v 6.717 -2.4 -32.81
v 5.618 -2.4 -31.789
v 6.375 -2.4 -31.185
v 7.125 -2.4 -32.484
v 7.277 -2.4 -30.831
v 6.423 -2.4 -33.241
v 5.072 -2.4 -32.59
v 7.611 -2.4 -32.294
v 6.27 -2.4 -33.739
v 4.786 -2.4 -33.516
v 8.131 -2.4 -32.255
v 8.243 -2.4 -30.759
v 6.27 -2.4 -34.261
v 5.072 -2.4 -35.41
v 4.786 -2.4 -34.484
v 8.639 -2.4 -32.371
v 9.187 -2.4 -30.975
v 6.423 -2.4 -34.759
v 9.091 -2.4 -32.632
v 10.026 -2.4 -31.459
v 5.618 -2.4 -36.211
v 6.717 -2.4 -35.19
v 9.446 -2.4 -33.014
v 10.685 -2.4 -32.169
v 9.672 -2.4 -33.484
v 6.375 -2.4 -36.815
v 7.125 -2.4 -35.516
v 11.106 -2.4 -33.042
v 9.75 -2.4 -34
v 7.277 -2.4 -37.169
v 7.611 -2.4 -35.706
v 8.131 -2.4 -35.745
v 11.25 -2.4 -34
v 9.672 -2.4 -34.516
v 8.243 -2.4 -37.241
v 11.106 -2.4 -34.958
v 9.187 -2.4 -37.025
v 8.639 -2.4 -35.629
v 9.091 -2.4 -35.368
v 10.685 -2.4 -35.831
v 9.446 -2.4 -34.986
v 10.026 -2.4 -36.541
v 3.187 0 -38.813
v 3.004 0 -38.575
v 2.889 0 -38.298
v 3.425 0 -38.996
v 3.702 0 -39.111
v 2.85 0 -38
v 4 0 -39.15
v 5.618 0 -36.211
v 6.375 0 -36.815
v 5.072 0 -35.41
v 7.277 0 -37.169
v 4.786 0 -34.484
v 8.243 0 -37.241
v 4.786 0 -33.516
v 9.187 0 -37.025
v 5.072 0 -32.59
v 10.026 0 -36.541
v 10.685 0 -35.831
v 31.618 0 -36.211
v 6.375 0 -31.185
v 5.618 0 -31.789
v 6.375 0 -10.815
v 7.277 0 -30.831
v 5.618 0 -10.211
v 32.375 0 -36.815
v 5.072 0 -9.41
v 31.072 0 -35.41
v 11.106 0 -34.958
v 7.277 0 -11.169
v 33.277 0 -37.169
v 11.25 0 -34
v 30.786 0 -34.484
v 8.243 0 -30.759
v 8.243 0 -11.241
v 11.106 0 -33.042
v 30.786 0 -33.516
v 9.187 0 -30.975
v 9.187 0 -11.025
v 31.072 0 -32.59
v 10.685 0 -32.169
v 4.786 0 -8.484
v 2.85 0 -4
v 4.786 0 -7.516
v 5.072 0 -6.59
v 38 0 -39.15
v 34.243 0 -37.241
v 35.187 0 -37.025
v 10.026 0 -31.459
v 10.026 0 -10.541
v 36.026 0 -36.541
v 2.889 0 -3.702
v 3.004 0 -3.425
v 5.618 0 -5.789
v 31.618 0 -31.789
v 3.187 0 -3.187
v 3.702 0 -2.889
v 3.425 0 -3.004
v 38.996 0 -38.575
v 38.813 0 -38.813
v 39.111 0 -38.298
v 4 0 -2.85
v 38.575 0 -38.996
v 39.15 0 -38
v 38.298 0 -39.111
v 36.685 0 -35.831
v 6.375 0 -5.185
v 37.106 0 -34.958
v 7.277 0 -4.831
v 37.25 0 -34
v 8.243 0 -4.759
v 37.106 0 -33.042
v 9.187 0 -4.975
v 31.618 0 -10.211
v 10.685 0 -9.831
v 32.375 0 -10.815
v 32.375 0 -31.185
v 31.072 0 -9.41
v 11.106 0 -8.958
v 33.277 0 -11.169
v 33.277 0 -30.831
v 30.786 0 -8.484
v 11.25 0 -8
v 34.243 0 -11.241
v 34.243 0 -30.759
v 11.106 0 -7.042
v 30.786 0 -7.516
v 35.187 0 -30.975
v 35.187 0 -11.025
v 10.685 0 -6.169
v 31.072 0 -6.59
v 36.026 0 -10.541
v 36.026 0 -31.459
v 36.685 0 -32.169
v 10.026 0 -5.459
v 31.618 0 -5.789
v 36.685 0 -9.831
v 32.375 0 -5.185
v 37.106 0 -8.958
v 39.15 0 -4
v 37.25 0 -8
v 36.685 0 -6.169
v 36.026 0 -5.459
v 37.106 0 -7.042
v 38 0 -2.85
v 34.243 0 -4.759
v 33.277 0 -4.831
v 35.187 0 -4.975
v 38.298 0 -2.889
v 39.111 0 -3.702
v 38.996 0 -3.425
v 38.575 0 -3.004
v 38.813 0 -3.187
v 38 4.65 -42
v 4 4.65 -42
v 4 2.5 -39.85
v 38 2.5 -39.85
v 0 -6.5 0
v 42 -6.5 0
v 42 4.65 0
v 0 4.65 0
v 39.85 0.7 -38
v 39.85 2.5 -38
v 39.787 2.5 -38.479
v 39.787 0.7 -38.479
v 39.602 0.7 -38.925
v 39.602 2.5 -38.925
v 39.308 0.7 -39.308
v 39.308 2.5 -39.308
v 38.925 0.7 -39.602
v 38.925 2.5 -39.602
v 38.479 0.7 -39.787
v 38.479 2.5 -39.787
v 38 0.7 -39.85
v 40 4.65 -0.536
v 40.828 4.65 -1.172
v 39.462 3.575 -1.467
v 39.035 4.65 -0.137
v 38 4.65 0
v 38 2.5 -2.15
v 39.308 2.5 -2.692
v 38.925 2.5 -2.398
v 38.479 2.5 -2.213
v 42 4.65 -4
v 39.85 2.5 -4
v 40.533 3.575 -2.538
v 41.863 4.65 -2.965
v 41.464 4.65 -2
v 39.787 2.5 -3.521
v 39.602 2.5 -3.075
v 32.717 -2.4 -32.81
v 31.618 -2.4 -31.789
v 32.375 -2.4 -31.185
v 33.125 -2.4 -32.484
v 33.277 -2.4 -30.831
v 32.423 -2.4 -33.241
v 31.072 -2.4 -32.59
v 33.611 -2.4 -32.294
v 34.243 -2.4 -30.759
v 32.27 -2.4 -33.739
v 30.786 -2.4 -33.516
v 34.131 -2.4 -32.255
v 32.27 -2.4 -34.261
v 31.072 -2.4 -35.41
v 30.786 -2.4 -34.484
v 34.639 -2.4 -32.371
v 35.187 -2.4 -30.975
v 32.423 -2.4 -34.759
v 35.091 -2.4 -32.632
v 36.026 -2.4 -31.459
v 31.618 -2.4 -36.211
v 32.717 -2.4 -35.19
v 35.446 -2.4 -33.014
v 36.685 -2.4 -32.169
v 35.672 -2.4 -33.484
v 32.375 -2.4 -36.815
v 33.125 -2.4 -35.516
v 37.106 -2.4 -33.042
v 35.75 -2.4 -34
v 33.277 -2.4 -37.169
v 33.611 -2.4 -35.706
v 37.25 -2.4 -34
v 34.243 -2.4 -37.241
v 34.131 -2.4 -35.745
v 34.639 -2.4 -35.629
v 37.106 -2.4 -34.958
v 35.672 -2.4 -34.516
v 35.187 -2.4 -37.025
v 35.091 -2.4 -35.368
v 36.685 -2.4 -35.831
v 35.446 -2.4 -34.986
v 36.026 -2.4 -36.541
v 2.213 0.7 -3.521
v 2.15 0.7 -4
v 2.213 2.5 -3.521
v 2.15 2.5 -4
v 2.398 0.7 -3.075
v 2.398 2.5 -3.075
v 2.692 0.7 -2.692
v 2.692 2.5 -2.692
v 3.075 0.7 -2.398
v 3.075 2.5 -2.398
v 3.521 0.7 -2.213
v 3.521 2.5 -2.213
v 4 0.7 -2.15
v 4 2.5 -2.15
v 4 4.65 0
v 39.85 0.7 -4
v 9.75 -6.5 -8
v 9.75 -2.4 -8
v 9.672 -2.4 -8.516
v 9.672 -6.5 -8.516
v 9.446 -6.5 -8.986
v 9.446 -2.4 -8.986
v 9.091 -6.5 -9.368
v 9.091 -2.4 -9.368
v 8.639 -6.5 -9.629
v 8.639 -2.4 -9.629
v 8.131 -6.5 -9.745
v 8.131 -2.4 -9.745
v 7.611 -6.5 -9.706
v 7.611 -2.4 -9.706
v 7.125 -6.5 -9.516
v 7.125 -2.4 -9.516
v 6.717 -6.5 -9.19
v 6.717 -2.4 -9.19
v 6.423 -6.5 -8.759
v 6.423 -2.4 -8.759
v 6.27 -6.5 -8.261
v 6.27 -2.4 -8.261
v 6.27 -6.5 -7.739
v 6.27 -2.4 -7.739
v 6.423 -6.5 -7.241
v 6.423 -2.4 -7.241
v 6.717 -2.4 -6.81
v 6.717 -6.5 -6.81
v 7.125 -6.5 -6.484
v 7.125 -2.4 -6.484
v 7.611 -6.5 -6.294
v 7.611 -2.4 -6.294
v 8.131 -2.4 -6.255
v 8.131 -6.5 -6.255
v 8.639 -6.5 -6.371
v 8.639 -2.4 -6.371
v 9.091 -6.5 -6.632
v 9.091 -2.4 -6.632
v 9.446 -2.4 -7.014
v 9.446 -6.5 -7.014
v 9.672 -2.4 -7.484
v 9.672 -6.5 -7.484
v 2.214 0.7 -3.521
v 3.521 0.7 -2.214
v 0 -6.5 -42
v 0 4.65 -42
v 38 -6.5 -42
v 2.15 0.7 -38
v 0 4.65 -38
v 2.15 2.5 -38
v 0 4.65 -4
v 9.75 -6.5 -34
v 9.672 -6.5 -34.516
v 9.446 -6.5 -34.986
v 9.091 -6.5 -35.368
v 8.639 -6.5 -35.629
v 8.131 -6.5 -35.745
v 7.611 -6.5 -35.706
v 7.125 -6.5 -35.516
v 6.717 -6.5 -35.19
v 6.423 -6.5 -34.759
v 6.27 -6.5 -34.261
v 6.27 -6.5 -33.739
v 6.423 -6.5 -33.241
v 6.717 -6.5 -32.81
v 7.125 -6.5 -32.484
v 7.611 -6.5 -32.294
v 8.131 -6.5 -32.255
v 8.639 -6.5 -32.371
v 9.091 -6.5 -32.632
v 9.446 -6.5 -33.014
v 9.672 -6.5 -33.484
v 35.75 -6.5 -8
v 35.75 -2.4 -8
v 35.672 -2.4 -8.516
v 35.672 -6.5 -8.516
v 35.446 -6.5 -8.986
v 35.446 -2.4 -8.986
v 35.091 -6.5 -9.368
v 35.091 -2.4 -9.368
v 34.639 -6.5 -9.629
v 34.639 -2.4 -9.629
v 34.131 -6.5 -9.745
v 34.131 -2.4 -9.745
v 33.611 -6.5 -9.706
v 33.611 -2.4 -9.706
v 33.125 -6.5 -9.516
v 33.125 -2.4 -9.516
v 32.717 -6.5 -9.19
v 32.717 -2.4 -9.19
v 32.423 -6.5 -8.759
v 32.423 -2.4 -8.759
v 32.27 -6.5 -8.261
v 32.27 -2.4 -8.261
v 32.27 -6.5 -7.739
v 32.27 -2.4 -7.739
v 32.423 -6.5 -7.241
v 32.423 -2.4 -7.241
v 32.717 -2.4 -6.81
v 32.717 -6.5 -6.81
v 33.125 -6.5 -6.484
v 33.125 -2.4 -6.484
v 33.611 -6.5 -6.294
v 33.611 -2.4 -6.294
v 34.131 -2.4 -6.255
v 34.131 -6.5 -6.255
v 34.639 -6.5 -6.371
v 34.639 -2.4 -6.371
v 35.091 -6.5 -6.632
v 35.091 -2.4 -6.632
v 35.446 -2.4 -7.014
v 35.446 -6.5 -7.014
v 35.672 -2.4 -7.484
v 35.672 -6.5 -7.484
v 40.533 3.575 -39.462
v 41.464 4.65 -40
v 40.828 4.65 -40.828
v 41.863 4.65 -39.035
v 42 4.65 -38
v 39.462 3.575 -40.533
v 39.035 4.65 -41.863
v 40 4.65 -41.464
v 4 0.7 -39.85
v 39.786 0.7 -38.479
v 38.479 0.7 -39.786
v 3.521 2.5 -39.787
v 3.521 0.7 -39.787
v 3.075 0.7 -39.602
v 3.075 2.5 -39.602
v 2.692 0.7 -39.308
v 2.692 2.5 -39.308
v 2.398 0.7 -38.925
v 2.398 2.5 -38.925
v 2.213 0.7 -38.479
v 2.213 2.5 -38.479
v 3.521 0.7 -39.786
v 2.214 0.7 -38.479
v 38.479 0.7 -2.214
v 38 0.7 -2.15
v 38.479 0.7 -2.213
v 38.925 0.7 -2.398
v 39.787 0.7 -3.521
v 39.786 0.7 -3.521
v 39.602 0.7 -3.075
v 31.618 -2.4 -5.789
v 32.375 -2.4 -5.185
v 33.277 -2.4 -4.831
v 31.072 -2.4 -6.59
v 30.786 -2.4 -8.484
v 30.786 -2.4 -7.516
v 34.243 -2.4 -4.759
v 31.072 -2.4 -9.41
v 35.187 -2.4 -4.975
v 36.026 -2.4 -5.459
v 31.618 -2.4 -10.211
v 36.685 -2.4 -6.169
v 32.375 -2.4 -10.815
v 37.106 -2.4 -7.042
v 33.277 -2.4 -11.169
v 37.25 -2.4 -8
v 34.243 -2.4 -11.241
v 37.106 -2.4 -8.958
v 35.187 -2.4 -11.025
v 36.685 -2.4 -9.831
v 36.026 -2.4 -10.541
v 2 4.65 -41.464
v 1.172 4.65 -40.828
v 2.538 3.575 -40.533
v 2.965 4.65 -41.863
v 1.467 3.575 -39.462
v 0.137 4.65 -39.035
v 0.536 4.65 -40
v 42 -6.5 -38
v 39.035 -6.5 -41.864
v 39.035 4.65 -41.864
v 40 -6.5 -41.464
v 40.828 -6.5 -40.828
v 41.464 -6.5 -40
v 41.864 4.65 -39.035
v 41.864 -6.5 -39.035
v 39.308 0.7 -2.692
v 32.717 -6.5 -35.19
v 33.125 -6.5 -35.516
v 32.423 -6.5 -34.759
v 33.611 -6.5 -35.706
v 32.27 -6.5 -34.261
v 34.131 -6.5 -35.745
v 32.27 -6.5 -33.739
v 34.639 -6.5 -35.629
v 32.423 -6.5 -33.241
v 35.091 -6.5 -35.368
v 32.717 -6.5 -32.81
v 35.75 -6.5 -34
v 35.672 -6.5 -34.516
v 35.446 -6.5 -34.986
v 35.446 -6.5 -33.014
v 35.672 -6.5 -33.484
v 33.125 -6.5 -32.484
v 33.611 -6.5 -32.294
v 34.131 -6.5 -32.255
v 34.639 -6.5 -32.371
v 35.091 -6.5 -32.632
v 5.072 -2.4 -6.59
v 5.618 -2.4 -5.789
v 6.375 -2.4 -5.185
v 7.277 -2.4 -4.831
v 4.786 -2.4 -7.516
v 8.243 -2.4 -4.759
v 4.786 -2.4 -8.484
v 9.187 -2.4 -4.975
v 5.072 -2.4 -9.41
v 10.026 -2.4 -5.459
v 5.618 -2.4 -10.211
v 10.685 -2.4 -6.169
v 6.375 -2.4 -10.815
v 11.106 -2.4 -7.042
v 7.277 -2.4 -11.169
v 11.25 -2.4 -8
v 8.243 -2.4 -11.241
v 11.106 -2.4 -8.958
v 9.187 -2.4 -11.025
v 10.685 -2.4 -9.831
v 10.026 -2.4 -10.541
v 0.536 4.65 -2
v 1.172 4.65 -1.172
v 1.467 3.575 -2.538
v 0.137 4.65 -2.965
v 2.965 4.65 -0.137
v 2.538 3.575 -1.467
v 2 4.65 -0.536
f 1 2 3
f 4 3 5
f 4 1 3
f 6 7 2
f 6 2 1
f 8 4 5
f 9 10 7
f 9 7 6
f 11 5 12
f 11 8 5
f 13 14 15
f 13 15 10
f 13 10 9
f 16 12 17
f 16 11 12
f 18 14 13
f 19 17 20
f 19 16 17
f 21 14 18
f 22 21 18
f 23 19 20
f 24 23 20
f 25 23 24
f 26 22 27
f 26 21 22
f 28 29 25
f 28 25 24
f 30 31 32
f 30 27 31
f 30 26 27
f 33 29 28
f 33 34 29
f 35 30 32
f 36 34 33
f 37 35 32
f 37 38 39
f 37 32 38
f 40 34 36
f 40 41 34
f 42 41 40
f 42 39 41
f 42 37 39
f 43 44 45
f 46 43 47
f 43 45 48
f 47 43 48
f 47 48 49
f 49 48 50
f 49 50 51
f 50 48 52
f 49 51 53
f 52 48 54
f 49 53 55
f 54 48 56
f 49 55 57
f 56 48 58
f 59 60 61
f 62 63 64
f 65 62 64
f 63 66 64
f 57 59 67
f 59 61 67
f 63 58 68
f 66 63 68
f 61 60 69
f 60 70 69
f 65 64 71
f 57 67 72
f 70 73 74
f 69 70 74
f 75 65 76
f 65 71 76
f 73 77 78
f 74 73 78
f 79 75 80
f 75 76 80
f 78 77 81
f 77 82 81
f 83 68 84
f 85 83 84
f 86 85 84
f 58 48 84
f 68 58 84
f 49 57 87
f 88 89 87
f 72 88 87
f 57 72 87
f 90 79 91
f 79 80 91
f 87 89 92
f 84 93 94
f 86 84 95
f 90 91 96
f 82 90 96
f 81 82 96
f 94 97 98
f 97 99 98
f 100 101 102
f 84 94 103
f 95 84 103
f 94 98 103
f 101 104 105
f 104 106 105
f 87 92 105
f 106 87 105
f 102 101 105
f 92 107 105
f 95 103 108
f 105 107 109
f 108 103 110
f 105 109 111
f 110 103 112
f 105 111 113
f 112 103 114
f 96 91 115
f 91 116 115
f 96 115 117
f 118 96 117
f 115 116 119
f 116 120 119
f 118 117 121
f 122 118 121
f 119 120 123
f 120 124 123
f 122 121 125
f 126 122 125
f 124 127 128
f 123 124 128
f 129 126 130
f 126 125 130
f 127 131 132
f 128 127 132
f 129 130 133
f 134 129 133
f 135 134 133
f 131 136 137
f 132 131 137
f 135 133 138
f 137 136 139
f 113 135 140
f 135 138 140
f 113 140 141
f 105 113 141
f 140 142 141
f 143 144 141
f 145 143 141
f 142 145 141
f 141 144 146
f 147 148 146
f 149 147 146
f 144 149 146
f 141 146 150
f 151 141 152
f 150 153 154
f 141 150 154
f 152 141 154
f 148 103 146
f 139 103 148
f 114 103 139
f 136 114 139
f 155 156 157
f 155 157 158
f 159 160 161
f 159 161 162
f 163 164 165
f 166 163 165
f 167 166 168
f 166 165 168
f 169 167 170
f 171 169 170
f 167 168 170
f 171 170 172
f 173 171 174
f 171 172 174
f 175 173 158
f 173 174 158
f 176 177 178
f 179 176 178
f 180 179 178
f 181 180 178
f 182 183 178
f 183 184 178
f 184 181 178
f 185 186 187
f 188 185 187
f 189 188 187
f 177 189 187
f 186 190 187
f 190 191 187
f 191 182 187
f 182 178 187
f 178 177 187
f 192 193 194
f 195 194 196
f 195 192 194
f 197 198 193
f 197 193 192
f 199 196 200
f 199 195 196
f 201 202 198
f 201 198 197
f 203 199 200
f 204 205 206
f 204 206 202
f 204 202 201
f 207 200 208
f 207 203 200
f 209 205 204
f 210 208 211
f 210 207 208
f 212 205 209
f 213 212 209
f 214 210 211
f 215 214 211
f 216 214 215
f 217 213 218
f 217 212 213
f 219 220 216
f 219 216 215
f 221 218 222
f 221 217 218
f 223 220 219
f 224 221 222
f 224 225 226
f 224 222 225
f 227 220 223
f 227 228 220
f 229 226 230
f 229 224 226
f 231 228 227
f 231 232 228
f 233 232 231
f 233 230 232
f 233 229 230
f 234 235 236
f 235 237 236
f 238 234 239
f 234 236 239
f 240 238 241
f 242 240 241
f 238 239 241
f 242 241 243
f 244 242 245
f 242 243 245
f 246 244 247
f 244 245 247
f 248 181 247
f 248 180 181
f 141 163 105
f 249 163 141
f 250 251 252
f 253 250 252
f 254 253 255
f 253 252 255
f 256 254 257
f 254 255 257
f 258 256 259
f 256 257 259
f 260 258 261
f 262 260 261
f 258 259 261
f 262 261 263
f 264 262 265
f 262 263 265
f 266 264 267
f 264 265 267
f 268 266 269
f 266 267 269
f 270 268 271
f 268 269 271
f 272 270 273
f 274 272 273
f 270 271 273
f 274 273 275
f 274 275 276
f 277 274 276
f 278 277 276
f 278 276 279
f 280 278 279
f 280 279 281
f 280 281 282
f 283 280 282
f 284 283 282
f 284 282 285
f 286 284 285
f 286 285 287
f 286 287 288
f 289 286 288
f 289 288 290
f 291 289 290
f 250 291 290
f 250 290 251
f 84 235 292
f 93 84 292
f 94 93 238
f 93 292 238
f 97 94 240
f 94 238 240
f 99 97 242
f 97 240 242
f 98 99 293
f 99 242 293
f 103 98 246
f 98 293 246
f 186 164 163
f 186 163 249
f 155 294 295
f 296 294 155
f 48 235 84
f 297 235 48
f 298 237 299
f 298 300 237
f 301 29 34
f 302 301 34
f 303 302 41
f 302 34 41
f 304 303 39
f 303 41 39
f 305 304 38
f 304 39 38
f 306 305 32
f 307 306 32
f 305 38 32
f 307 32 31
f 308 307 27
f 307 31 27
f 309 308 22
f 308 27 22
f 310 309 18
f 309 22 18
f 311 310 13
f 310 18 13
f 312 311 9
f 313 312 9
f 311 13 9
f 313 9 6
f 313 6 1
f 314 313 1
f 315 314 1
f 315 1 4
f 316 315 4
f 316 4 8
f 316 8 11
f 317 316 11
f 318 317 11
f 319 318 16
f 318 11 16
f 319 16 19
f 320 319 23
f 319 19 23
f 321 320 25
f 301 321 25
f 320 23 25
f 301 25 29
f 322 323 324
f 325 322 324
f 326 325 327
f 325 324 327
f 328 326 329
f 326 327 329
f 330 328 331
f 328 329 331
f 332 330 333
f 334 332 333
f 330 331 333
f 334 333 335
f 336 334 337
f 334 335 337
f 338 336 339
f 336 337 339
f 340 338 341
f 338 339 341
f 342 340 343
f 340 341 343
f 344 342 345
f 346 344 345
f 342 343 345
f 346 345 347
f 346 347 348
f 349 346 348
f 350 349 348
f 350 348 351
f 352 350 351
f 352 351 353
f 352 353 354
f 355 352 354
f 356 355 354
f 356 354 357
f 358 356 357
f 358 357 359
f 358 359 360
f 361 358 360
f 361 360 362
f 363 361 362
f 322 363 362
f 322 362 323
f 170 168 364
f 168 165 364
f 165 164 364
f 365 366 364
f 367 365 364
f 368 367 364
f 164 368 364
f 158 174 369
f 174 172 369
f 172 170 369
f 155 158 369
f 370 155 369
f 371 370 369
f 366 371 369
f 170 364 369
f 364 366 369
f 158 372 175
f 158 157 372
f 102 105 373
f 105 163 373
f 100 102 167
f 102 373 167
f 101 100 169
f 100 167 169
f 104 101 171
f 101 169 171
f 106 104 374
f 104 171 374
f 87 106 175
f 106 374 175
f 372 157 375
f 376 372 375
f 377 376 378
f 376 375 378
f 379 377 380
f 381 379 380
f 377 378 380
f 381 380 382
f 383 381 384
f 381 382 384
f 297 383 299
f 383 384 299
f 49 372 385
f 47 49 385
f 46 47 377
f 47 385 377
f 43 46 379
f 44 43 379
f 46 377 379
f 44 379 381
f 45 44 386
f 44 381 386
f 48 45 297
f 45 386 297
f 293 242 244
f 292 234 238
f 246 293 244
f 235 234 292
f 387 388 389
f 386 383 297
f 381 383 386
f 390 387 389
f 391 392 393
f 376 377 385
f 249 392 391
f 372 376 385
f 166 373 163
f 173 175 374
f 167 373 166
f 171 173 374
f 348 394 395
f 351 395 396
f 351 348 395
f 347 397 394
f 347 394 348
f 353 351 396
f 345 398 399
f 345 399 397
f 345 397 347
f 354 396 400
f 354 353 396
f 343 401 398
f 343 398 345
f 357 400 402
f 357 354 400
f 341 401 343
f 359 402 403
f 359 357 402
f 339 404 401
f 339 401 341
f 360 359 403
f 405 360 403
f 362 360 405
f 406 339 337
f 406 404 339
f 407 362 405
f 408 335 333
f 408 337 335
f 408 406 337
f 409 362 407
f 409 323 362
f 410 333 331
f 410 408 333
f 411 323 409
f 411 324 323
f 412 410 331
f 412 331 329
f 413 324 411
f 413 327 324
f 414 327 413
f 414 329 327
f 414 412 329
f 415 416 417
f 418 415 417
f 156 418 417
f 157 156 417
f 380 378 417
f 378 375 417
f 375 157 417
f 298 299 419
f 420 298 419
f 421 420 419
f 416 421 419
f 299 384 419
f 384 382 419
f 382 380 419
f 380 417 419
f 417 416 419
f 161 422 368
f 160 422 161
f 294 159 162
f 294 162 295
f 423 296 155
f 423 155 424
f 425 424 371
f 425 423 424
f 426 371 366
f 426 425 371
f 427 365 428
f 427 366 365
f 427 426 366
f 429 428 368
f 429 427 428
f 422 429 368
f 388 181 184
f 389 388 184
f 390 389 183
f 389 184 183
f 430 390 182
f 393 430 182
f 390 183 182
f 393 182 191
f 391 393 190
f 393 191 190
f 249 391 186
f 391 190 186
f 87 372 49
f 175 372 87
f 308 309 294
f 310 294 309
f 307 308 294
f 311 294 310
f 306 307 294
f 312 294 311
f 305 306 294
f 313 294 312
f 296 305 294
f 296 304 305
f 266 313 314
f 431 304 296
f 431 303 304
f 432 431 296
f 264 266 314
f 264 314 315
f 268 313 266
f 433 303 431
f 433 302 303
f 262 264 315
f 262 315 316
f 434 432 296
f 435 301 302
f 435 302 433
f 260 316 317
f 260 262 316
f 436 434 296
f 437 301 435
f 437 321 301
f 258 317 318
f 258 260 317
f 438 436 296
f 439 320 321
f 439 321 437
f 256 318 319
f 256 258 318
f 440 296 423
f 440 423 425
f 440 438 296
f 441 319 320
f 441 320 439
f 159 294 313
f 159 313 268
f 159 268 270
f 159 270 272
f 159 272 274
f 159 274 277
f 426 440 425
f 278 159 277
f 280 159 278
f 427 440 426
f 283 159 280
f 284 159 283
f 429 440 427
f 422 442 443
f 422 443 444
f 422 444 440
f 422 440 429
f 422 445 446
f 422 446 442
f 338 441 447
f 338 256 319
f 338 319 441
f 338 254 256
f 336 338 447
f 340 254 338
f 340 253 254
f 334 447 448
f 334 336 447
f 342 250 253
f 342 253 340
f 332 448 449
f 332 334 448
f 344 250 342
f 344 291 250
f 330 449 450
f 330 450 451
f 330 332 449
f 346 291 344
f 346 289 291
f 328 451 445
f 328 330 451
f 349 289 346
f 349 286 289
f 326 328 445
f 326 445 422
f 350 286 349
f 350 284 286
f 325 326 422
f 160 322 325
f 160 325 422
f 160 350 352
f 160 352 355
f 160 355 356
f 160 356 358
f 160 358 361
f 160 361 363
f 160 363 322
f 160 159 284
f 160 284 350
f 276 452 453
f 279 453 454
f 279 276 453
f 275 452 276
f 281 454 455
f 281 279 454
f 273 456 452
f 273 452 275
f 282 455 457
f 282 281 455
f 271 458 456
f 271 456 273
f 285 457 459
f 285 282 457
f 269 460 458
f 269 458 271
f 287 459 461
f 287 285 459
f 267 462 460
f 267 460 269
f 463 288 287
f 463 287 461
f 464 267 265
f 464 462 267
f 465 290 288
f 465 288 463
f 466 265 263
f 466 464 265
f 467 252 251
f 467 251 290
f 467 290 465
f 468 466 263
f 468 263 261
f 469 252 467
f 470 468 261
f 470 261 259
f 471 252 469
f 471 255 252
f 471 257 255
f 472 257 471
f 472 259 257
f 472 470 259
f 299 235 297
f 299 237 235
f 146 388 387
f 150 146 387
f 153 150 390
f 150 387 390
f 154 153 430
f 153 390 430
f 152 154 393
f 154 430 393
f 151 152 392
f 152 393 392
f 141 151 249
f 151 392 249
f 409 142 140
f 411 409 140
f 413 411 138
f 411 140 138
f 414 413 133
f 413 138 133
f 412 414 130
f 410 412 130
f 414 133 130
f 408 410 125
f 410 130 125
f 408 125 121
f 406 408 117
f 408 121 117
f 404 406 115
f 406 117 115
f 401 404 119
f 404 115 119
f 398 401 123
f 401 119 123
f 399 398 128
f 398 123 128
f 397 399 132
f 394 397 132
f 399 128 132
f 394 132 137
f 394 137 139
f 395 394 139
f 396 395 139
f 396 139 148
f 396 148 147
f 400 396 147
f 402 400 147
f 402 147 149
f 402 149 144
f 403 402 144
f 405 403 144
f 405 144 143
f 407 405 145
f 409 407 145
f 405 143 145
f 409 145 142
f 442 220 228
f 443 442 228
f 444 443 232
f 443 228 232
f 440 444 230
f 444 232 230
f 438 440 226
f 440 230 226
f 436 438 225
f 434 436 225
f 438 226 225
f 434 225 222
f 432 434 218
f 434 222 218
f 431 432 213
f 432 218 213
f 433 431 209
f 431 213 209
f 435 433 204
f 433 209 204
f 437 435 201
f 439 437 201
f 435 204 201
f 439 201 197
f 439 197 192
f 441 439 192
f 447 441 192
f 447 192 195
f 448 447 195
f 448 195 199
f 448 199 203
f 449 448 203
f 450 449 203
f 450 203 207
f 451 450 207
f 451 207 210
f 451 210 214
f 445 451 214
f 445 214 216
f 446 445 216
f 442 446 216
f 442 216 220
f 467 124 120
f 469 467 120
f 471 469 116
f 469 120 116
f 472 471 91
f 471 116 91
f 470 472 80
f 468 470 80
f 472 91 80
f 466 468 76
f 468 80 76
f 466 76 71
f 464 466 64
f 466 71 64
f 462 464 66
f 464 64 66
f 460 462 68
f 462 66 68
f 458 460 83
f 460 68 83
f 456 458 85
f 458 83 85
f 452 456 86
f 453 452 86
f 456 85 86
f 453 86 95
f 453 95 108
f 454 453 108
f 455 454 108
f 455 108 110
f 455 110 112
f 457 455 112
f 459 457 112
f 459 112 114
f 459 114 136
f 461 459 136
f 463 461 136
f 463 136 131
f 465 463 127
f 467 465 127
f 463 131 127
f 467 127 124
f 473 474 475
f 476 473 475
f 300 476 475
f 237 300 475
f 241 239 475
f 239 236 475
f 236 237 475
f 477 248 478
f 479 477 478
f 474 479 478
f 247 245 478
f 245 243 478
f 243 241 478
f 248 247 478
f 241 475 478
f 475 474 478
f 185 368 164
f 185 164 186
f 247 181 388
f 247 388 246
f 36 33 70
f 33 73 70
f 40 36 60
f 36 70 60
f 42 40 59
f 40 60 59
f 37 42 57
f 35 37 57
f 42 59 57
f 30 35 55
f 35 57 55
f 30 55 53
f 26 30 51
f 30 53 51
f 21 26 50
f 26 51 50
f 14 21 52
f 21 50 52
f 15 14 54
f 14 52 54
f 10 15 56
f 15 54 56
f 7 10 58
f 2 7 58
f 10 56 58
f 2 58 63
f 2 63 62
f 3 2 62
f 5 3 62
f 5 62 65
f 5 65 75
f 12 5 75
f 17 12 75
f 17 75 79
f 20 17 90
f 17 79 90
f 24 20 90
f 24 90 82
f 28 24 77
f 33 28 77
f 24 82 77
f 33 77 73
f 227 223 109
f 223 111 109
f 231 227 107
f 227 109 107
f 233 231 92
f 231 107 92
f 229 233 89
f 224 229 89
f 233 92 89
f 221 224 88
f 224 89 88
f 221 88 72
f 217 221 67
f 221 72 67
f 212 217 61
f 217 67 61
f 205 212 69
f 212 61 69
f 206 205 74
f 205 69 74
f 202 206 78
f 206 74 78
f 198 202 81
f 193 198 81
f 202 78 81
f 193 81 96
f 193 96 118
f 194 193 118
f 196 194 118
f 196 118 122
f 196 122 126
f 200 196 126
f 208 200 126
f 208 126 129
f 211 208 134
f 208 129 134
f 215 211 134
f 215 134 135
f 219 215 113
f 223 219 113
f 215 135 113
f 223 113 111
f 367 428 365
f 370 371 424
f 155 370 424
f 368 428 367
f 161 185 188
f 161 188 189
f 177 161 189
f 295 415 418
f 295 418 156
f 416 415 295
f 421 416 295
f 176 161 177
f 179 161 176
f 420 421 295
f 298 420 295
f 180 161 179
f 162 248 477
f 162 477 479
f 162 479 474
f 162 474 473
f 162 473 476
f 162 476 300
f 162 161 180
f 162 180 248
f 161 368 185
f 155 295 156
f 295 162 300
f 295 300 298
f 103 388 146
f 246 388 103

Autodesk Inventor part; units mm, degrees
ref_plane "YZ Plane" through (0, 0, 0) normal (1, 0, 0) x (0, 1, 0)
ref_plane "XZ Plane" through (0, 0, 0) normal (0, 1, 0) x (-1, 0, 0)
ref_plane "XY Plane" through (0, 0, 0) normal (0, 0, 1) x (1, 0, 0)
sketch "Sketch1" plane through (0, 0, 0) normal (0, 1, 0) x (-1, 0, 0)
  line L0 (0, -42) -> (-38, -42)
  line L1 (-42, -38) -> (-42, 0)
  line L2 (-42, 0) -> (0, 0)
  line L3 (0, 0) -> (0, -42)
  arc A0 (-42, -38) -> (-38, -42) centre (-38, -38) ccw
  point P0 (-42, -42)
  dimension "d0" = 42
  dimension "d1" = 42
  dimension "d31" = 4
extrude "square-base" add sketch "Sketch1" along normal blind 4.65
sketch "Sketch2" plane through (0, 4.65, 0) normal (0, 1, 0) x (1, 0, 0)
  line L0 (4, 39.15) -> (38, 39.15)
  line L1 (39.15, 38) -> (39.15, 4)
  line L2 (38, 2.85) -> (4, 2.85)
  line L3 (2.85, 4) -> (2.85, 38)
  line L4 (38, 42) -> (0, 42) projected
  line L5 (0, 42) -> (0, 0) projected
  line L6 (42, 0) -> (42, 38) projected
  line L7 (0, 0) -> (42, 0) projected
  arc A0 (39.15, 38) -> (38, 39.15) centre (38, 38) ccw
  arc A1 (38, 2.85) -> (39.15, 4) centre (38, 4) ccw
  arc A2 (2.85, 4) -> (4, 2.85) centre (4, 4) ccw
  arc A3 (4, 39.15) -> (2.85, 38) centre (4, 38) ccw
  point P0 (2.85, 39.15)
  point P1 (39.15, 2.85)
  point P2 (39.15, 39.15)
  point P3 (2.85, 2.85)
  point P4 (42, 42)
  dimension "d4" = 2.85
  dimension "d5" = 2.85
  dimension "d6" = 2.85
  dimension "d7" = 2.85
  dimension "d29" = 1.15
extrude "Extrusion2" cut sketch "Sketch2" against normal through all
sketch "Sketch3" plane through (0, 4.65, 0) normal (0, 1, 0) x (1, 0, 0)
  line L0 (38, 2.15) -> (4, 2.15)
  line L1 (2.15, 4) -> (2.15, 38)
  line L2 (4, 39.85) -> (38, 39.85)
  line L3 (39.85, 38) -> (39.85, 4)
  line L4 (0, 42) -> (0, 0) projected
  line L5 (38, 2.85) -> (4, 2.85) projected
  line L6 (42, 0) -> (42, 38) projected
  line L7 (38, 42) -> (0, 42) projected
  line L8 (0, 0) -> (42, 0) projected
  line L9 (39.15, 38) -> (39.15, 4) projected
  line L10 (2.85, 4) -> (2.85, 38) projected
  line L11 (4, 39.15) -> (38, 39.15) projected
  arc A0 (39.85, 38) -> (38, 39.85) centre (38, 38) ccw
  arc A1 (38, 2.15) -> (39.85, 4) centre (38, 4) ccw
  arc A2 (2.15, 4) -> (4, 2.15) centre (4, 4) ccw
  arc A3 (4, 39.85) -> (2.15, 38) centre (4, 38) ccw
  point P0 (39.85, 2.15)
  point P1 (2.15, 39.85)
  point P2 (2.15, 2.15)
  point P3 (39.85, 39.85)
  point P4 (39.15, 2.85)
  point P5 (2.85, 2.85)
  point P6 (42, 42)
  point P7 (39.15, 39.15)
  point P8 (2.85, 39.15)
  dimension "d10" = 2.15
  dimension "d12" = 2.15
  dimension "d13" = 2.15
  dimension "d14" = 2.15
  dimension "d30" = 1.85
extrude "Extrusion3" cut sketch "Sketch3" against normal blind 3.95
chamfer "Chamfer2" distance 0.7 angle 45 4 edges at (39.15, 0.7, -21) (21, 0.7, -2.85) (2.85, 0.7, -21) (21, 0.7, -39.15)
chamfer "Chamfer1" distance 2.15 angle 45 8 edges at (39.85, 4.65, -21) (39.3081, 4.65, -2.6919) (21, 4.65, -2.15) (2.6919, 4.65, -2.6919) (2.15, 4.65, -21) (2.6919, 4.65, -39.3081) (21, 4.65, -39.85) (39.3081, 4.65, -39.3081)
sketch "Sketch5" plane through (0, 0, 0) normal (0, -1, 0) x (1, 0, 0)
  arc A0 (38, -39.15) -> (39.15, -38) centre (38, -38) ccw projected
  line L0 (38, -39.15) -> (4, -39.15) projected
  arc A1 (2.85, -38) -> (4, -39.15) centre (4, -38) ccw projected
  line L1 (2.85, -38) -> (2.85, -4) projected
  arc A2 (4, -2.85) -> (2.85, -4) centre (4, -4) ccw projected
  line L2 (4, -2.85) -> (38, -2.85) projected
  arc A3 (39.15, -4) -> (38, -2.85) centre (38, -4) ccw projected
  line L3 (39.15, -4) -> (39.15, -38) projected
  line L4 (38, -42) -> (0, -42) projected
  arc A4 (38, -42) -> (42, -38) centre (38, -38) ccw projected
  line L5 (42, 0) -> (42, -38) projected
  line L6 (0, 0) -> (42, 0) projected
  line L7 (0, -42) -> (0, 0) projected
extrude "weighted-base" add sketch "Sketch5" along normal blind 6.5 contours L0 A1 L1 A2 L2 A3 L3 A0 | L4 L7 L6 L5 A4
sketch "Sketch6" plane through (0, 0, 0) normal (0, 1, 0) x (1, 0, 0)
  circle A0 centre (34, 8) radius 3.25
  circle A1 centre (8, 8) radius 3.25
  circle A2 centre (34, 34) radius 3.25
  circle A3 centre (8, 34) radius 3.25
  line L0 (4, 0) -> (38, 0) projected
  line L1 (42, 4) -> (42, 38) projected
  line L2 (38, 42) -> (4, 42) projected
  line L3 (0, 38) -> (0, 4) projected
  point P0 (0, 0)
  dimension "d34" = 6.5
  dimension "d35" = 8
  dimension "d36" = 8
  dimension "d37" = 8
  dimension "d38" = 8
extrude "Extrusion5" cut sketch "Sketch6" against normal blind 2.4
sketch "Sketch7" plane through (34, -2.4, -8) normal (0, 1, 0) x (1, 0, 0)
  circle A0 centre (0, 0) radius 1.75
  circle A1 centre (-26, 0) radius 1.75
  circle A2 centre (-26, 26) radius 1.75
  circle A3 centre (0, 26) radius 1.75
  circle A4 centre (0, 0) radius 3.25 projected
  circle A5 centre (-26, 0) radius 3.25 projected
  circle A6 centre (-26, 26) radius 3.25 projected
  circle A7 centre (0, 26) radius 3.25 projected
  point P0 (-34, -8)
  dimension "d41" = 3.5
extrude "Extrusion6" cut sketch "Sketch7" against normal through all contours A0 | A1 | A2 | A3
equation "\"d1\" = d0"
equation "\"d5\" = d4"
equation "\"d6\" = d4"
equation "\"d7\" = d4"
equation "\"d12\" = d10"
equation "\"d13\" = d10"
equation "\"d14\" = d10"
equation "\"d36\" = d35"
equation "\"d37\" = d35"
equation "\"d38\" = d35"
properties part number "base-plate-weighted"
